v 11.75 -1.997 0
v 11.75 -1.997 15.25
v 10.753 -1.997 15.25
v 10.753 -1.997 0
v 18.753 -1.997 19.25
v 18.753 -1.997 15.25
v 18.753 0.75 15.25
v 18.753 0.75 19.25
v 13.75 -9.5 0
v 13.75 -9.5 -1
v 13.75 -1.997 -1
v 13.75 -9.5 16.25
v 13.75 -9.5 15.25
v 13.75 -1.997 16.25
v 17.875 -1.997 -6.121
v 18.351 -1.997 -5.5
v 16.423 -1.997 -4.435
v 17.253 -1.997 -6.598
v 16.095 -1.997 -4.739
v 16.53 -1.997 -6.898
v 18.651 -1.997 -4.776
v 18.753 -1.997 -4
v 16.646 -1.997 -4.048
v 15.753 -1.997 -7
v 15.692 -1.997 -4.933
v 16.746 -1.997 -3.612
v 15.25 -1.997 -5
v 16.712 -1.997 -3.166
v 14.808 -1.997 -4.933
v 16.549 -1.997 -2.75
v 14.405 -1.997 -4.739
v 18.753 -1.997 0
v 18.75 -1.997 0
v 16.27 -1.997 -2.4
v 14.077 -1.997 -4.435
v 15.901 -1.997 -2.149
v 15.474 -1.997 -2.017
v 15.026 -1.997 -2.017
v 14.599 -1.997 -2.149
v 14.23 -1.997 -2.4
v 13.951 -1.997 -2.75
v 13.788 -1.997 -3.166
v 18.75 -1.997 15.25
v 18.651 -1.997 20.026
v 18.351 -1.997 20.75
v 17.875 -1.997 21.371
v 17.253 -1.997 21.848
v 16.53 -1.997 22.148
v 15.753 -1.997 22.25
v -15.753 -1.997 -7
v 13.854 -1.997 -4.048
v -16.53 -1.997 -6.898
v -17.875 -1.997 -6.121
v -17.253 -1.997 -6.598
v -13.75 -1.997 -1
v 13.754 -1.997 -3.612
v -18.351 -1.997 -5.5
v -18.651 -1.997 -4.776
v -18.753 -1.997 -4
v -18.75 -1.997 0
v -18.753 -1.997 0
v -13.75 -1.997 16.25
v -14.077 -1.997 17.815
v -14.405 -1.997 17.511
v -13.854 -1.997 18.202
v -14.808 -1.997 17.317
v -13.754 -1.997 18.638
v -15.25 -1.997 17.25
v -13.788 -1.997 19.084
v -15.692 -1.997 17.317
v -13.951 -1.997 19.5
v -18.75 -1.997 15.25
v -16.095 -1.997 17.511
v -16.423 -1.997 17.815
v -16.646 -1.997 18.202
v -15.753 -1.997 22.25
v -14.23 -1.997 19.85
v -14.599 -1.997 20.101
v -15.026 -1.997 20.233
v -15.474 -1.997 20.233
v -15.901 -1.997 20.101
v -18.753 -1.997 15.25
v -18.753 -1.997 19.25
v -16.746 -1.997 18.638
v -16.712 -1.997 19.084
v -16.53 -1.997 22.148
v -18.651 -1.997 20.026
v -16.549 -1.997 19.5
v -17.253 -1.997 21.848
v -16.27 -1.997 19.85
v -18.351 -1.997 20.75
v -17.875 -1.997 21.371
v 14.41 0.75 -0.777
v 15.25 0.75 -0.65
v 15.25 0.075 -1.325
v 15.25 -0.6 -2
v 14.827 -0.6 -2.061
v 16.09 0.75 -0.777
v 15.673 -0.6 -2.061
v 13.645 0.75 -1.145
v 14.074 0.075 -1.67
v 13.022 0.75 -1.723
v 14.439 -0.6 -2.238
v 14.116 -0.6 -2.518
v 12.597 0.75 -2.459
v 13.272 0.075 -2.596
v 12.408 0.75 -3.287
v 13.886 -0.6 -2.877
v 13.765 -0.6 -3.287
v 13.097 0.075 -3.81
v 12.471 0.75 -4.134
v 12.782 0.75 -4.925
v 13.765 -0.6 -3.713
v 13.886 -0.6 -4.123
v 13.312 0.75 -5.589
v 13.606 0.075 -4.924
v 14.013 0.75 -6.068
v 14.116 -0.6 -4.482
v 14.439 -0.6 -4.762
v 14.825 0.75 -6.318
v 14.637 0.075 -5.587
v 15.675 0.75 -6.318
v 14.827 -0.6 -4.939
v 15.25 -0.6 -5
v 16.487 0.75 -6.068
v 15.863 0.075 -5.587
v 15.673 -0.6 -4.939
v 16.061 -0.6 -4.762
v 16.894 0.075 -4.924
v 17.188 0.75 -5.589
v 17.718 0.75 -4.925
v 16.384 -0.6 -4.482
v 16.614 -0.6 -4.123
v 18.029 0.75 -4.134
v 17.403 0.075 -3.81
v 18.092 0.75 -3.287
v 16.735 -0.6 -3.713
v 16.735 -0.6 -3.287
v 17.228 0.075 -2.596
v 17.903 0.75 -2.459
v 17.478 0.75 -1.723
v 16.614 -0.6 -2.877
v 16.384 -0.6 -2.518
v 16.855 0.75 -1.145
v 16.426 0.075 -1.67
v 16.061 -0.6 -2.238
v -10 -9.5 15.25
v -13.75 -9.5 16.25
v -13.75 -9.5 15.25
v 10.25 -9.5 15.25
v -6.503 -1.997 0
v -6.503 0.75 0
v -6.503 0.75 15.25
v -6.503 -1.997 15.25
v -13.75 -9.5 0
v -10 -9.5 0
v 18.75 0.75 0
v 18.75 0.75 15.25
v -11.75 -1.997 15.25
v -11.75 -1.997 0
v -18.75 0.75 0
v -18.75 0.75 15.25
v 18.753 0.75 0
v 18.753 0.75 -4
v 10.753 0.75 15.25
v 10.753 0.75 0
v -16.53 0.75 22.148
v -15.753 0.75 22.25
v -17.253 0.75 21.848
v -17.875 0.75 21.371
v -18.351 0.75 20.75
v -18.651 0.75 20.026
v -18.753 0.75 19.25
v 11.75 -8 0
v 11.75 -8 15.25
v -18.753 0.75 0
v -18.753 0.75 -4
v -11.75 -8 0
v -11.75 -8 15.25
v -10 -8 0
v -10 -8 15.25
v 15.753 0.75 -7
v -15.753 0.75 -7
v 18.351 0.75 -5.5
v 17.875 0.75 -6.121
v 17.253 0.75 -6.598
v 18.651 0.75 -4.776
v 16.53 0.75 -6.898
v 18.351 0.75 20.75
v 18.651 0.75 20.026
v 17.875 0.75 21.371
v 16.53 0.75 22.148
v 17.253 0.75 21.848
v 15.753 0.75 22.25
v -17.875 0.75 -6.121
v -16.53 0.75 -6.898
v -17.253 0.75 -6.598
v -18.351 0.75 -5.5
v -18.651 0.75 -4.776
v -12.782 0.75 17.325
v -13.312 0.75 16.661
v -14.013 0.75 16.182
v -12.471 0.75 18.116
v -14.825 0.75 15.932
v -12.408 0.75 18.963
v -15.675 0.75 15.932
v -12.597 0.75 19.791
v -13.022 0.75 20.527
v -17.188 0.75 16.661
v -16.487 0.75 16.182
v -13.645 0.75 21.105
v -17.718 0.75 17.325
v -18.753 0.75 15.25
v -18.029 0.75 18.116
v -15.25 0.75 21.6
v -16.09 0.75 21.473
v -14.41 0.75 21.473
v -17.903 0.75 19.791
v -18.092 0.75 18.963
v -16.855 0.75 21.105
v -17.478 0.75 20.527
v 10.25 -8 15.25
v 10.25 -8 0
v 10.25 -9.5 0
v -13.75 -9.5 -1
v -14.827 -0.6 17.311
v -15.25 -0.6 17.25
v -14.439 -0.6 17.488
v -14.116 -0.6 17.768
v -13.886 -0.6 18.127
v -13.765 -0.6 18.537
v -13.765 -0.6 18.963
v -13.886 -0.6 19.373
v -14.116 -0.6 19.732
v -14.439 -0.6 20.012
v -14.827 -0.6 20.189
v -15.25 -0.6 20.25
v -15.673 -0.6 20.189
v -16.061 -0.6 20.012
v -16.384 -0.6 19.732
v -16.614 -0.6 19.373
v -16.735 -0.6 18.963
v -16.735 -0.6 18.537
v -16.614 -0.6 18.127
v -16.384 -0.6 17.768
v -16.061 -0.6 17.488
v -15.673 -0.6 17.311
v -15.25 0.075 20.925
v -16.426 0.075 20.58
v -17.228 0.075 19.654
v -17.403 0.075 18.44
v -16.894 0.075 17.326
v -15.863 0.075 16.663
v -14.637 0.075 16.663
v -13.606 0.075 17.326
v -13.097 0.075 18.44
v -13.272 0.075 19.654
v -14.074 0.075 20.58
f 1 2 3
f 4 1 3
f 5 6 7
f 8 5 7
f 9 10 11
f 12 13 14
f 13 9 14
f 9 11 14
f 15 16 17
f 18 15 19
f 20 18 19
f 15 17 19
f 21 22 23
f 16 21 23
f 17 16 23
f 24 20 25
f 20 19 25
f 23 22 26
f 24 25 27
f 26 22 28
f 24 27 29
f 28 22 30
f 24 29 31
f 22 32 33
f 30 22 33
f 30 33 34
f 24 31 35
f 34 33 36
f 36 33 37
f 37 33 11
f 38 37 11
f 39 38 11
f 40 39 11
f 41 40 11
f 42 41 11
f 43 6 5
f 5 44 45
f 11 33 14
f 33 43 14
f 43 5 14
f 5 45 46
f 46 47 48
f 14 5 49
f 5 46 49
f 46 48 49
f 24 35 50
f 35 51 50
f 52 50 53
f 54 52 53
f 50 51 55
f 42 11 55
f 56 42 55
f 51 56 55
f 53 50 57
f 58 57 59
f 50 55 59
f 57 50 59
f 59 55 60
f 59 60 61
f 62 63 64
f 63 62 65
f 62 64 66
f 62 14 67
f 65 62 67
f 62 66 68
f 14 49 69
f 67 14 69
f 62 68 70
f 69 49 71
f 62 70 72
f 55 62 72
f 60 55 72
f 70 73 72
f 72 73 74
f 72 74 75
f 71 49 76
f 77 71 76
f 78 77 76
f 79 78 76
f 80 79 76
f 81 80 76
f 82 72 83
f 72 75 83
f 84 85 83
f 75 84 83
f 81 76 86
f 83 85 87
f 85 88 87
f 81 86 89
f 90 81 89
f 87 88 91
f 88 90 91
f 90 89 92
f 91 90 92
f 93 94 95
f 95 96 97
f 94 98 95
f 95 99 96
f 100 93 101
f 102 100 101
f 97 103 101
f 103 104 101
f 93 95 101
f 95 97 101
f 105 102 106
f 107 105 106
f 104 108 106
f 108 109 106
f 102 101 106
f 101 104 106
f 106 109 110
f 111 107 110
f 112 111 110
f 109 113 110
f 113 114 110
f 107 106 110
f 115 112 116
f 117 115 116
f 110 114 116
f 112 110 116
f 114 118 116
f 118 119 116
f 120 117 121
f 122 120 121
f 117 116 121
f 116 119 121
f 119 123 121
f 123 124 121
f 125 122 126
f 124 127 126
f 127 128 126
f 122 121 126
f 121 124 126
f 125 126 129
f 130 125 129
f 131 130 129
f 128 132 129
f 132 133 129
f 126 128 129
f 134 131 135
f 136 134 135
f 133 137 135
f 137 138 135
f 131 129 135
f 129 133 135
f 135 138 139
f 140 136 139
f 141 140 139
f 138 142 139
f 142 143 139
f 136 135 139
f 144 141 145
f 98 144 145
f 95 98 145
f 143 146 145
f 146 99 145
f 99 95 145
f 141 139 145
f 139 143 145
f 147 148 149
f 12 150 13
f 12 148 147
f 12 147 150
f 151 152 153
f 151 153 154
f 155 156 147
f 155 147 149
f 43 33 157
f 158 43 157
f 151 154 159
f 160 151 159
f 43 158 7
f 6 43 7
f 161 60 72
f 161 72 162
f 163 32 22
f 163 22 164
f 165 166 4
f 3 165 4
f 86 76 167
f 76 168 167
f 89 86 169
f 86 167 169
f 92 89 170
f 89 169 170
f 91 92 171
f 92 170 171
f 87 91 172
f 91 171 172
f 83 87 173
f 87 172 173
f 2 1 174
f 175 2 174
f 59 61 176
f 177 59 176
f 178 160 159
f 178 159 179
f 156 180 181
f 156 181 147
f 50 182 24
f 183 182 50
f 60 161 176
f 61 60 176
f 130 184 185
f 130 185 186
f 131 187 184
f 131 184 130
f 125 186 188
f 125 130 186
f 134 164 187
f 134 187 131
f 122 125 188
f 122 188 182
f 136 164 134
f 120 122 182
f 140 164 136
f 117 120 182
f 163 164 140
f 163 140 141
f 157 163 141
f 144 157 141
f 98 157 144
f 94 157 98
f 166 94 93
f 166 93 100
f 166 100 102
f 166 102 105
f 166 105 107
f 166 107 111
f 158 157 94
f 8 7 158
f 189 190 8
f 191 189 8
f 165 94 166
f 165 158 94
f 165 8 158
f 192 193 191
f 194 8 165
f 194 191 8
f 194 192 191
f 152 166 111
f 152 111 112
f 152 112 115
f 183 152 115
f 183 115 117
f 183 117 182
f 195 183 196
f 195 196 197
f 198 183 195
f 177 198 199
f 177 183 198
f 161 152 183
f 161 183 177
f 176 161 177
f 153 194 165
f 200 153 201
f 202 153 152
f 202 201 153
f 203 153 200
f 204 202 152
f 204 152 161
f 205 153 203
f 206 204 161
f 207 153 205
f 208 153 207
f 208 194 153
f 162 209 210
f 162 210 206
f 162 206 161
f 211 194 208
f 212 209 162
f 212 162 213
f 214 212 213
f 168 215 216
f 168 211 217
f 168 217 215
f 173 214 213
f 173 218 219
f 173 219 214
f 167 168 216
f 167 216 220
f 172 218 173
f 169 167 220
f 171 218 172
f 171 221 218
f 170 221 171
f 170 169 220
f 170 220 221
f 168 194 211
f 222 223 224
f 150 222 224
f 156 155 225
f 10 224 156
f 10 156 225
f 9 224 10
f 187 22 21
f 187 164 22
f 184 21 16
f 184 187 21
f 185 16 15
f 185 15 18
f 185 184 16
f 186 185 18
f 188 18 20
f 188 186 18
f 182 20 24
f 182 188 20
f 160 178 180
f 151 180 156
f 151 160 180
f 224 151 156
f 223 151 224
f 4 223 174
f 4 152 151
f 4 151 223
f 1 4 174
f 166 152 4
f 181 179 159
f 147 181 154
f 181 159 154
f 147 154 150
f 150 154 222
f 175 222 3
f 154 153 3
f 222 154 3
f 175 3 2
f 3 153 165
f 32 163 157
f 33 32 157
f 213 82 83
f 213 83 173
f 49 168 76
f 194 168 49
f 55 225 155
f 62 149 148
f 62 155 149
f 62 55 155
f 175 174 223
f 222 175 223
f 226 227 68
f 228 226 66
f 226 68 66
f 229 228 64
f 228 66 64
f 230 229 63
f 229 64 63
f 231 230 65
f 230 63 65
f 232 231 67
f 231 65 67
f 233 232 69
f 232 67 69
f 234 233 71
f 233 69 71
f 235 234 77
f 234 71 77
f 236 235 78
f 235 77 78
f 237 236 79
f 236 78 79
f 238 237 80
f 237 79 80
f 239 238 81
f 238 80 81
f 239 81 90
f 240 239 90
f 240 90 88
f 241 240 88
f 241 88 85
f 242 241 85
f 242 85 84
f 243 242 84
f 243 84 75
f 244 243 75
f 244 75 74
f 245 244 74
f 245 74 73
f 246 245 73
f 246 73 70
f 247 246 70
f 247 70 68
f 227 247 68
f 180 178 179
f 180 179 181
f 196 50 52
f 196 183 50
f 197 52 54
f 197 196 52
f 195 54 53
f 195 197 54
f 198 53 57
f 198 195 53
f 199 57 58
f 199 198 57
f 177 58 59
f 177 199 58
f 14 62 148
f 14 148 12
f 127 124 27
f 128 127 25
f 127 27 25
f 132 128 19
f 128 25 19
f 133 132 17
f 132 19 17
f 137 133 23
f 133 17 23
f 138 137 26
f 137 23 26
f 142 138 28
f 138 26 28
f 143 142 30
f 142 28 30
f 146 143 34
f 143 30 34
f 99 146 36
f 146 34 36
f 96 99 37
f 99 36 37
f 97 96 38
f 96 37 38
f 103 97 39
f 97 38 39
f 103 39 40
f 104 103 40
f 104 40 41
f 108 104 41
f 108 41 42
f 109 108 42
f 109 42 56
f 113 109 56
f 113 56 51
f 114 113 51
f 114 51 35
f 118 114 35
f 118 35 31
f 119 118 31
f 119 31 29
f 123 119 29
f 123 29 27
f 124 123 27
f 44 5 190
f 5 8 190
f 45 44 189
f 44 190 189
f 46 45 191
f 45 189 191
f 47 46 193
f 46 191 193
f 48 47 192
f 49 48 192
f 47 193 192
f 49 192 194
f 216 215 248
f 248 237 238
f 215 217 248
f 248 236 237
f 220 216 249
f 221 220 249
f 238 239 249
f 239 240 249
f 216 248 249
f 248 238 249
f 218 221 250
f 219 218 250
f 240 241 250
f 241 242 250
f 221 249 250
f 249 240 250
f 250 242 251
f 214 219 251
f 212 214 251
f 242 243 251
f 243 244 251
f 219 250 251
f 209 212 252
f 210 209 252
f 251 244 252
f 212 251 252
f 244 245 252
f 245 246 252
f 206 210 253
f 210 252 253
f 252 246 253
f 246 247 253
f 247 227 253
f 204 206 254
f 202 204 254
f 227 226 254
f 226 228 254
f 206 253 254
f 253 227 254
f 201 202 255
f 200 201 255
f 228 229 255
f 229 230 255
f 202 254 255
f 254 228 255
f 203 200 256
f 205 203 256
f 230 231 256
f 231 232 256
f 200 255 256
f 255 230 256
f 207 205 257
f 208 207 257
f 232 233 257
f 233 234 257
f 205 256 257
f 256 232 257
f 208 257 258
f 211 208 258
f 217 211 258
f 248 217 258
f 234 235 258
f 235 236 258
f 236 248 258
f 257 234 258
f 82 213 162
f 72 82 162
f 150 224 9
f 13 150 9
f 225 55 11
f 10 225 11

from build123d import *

# Parameters (mm, degrees)
BOSS_EXTRUDE1_DEPTH   = 15.25
BOSS_EXTRUDE1_2_DEPTH = 15.25
SKETCH2_W             = 37.506767834
SKETCH2_H             = 2.746604554
BOSS_EXTRUDE2_DEPTH   = 7
SKETCH3_W             = 37.506767834
SKETCH3_H             = 2.746604554
BOSS_EXTRUDE3_DEPTH   = 7
SKETCH9_R             = 1.5
CUT_EXTRUDE1_DEPTH    = 12
FILLET1_R             = 3
SKETCH11_W            = 27.5
SKETCH11_H            = 1
BOSS_EXTRUDE5_DEPTH   = 7.503395


with BuildPart() as part:
    # Sketch1 → Boss-Extrude1 (new body)
    with BuildSketch(Plane.XY):
        Polygon((10.25, -8), (10.25, -9.5), (13.75, -9.5), (13.75, -1.996604554), (18.75, -1.996604554), (18.75, 0.75), (10.753383917, 0.75), (10.753383917, -1.996604554), (11.75, -1.996604554), (11.75, -8), align=None)
    extrude(amount=BOSS_EXTRUDE1_DEPTH)



with BuildPart() as body_2:
    # Sketch1 → Boss-Extrude1 2 (new body)
    with BuildSketch(Plane.XY):
        Polygon((-11.75, -8), (-10, -8), (-10, -9.5), (-13.75, -9.5), (-13.75, -1.996604554), (-18.75, -1.996604554), (-18.75, 0.75), (-6.503383917, 0.75), (-6.503383917, -1.996604554), (-11.75, -1.996604554), align=None)
    extrude(amount=BOSS_EXTRUDE1_2_DEPTH)


with BuildPart() as part_1:
    add(part.part)

    add(body_2.part)  # Boss-Extrude2 merges body 2
    # Sketch2 → Boss-Extrude2 (add)
    with BuildSketch(Plane.XY.offset(15.25)):
        with Locations((0, -0.623302277)):
            Rectangle(SKETCH2_W, SKETCH2_H)
    extrude(amount=BOSS_EXTRUDE2_DEPTH)

    # Sketch3 → Boss-Extrude3 (add)
    with BuildSketch(Plane(origin=(0, 0, 0), x_dir=(-1, 0, 0), z_dir=(0, 0, -1))):
        with Locations((0, -0.623302277)):
            Rectangle(SKETCH3_W, SKETCH3_H)
    extrude(amount=BOSS_EXTRUDE3_DEPTH)

    # Sketch9 → Cut-Extrude1 (cut)
    with BuildSketch(Plane.XZ.offset(1.996604554)):
        with Locations(Location((-15.25, 18.75, 0), (0, 0, 270))):
            Circle(SKETCH9_R)
        with Locations(Location((15.25, -3.5, 0), (0, 0, 270))):
            Circle(SKETCH9_R)
    extrude(amount=-CUT_EXTRUDE1_DEPTH, mode=Mode.SUBTRACT)

    # Fillet1
    fillet1_edges = [part_1.edges().sort_by_distance(p)[0] for p in [
        (-18.753383917, -0.623302277, 22.25),
        (18.753383917, -0.623302277, 22.25),
        (18.753383917, -0.623302277, -7),
        (-18.753383917, -0.623302277, -7),
    ]]
    fillet(fillet1_edges, radius=FILLET1_R)

    # Cut-Extrude2 cone 1 section (through the dimple's axis) → Cut-Extrude2 (revolve, cut)
    with BuildSketch(Plane(origin=(-15.25, 0.75, 18.75), x_dir=(0, 0, 1), z_dir=(1, 0, 0))):
        Polygon((0, 0), (2.85, 0), (0, 2.85), align=None)
    revolve(axis=Axis((-15.25, 0.75, 18.75), (0, -1, 0)), mode=Mode.SUBTRACT)

    # Cut-Extrude2 cone 2 section (through the dimple's axis) → Cut-Extrude2 cone 2 (revolve, cut)
    with BuildSketch(Plane(origin=(15.25, 0.75, -3.5), x_dir=(0, 0, 1), z_dir=(1, 0, 0))):
        Polygon((0, 0), (2.85, 0), (0, 2.85), align=None)
    revolve(axis=Axis((15.25, 0.75, -3.5), (0, -1, 0)), mode=Mode.SUBTRACT)

    # Sketch11 → Boss-Extrude5 (add)
    with BuildSketch(Plane.XZ.offset(1.996604554)):
        with Locations((0, 15.75)):
            Rectangle(SKETCH11_W, SKETCH11_H)
        with Locations((0, -0.5)):
            Rectangle(SKETCH11_W, SKETCH11_H)
    extrude(amount=BOSS_EXTRUDE5_DEPTH)


solid = part_1.part
